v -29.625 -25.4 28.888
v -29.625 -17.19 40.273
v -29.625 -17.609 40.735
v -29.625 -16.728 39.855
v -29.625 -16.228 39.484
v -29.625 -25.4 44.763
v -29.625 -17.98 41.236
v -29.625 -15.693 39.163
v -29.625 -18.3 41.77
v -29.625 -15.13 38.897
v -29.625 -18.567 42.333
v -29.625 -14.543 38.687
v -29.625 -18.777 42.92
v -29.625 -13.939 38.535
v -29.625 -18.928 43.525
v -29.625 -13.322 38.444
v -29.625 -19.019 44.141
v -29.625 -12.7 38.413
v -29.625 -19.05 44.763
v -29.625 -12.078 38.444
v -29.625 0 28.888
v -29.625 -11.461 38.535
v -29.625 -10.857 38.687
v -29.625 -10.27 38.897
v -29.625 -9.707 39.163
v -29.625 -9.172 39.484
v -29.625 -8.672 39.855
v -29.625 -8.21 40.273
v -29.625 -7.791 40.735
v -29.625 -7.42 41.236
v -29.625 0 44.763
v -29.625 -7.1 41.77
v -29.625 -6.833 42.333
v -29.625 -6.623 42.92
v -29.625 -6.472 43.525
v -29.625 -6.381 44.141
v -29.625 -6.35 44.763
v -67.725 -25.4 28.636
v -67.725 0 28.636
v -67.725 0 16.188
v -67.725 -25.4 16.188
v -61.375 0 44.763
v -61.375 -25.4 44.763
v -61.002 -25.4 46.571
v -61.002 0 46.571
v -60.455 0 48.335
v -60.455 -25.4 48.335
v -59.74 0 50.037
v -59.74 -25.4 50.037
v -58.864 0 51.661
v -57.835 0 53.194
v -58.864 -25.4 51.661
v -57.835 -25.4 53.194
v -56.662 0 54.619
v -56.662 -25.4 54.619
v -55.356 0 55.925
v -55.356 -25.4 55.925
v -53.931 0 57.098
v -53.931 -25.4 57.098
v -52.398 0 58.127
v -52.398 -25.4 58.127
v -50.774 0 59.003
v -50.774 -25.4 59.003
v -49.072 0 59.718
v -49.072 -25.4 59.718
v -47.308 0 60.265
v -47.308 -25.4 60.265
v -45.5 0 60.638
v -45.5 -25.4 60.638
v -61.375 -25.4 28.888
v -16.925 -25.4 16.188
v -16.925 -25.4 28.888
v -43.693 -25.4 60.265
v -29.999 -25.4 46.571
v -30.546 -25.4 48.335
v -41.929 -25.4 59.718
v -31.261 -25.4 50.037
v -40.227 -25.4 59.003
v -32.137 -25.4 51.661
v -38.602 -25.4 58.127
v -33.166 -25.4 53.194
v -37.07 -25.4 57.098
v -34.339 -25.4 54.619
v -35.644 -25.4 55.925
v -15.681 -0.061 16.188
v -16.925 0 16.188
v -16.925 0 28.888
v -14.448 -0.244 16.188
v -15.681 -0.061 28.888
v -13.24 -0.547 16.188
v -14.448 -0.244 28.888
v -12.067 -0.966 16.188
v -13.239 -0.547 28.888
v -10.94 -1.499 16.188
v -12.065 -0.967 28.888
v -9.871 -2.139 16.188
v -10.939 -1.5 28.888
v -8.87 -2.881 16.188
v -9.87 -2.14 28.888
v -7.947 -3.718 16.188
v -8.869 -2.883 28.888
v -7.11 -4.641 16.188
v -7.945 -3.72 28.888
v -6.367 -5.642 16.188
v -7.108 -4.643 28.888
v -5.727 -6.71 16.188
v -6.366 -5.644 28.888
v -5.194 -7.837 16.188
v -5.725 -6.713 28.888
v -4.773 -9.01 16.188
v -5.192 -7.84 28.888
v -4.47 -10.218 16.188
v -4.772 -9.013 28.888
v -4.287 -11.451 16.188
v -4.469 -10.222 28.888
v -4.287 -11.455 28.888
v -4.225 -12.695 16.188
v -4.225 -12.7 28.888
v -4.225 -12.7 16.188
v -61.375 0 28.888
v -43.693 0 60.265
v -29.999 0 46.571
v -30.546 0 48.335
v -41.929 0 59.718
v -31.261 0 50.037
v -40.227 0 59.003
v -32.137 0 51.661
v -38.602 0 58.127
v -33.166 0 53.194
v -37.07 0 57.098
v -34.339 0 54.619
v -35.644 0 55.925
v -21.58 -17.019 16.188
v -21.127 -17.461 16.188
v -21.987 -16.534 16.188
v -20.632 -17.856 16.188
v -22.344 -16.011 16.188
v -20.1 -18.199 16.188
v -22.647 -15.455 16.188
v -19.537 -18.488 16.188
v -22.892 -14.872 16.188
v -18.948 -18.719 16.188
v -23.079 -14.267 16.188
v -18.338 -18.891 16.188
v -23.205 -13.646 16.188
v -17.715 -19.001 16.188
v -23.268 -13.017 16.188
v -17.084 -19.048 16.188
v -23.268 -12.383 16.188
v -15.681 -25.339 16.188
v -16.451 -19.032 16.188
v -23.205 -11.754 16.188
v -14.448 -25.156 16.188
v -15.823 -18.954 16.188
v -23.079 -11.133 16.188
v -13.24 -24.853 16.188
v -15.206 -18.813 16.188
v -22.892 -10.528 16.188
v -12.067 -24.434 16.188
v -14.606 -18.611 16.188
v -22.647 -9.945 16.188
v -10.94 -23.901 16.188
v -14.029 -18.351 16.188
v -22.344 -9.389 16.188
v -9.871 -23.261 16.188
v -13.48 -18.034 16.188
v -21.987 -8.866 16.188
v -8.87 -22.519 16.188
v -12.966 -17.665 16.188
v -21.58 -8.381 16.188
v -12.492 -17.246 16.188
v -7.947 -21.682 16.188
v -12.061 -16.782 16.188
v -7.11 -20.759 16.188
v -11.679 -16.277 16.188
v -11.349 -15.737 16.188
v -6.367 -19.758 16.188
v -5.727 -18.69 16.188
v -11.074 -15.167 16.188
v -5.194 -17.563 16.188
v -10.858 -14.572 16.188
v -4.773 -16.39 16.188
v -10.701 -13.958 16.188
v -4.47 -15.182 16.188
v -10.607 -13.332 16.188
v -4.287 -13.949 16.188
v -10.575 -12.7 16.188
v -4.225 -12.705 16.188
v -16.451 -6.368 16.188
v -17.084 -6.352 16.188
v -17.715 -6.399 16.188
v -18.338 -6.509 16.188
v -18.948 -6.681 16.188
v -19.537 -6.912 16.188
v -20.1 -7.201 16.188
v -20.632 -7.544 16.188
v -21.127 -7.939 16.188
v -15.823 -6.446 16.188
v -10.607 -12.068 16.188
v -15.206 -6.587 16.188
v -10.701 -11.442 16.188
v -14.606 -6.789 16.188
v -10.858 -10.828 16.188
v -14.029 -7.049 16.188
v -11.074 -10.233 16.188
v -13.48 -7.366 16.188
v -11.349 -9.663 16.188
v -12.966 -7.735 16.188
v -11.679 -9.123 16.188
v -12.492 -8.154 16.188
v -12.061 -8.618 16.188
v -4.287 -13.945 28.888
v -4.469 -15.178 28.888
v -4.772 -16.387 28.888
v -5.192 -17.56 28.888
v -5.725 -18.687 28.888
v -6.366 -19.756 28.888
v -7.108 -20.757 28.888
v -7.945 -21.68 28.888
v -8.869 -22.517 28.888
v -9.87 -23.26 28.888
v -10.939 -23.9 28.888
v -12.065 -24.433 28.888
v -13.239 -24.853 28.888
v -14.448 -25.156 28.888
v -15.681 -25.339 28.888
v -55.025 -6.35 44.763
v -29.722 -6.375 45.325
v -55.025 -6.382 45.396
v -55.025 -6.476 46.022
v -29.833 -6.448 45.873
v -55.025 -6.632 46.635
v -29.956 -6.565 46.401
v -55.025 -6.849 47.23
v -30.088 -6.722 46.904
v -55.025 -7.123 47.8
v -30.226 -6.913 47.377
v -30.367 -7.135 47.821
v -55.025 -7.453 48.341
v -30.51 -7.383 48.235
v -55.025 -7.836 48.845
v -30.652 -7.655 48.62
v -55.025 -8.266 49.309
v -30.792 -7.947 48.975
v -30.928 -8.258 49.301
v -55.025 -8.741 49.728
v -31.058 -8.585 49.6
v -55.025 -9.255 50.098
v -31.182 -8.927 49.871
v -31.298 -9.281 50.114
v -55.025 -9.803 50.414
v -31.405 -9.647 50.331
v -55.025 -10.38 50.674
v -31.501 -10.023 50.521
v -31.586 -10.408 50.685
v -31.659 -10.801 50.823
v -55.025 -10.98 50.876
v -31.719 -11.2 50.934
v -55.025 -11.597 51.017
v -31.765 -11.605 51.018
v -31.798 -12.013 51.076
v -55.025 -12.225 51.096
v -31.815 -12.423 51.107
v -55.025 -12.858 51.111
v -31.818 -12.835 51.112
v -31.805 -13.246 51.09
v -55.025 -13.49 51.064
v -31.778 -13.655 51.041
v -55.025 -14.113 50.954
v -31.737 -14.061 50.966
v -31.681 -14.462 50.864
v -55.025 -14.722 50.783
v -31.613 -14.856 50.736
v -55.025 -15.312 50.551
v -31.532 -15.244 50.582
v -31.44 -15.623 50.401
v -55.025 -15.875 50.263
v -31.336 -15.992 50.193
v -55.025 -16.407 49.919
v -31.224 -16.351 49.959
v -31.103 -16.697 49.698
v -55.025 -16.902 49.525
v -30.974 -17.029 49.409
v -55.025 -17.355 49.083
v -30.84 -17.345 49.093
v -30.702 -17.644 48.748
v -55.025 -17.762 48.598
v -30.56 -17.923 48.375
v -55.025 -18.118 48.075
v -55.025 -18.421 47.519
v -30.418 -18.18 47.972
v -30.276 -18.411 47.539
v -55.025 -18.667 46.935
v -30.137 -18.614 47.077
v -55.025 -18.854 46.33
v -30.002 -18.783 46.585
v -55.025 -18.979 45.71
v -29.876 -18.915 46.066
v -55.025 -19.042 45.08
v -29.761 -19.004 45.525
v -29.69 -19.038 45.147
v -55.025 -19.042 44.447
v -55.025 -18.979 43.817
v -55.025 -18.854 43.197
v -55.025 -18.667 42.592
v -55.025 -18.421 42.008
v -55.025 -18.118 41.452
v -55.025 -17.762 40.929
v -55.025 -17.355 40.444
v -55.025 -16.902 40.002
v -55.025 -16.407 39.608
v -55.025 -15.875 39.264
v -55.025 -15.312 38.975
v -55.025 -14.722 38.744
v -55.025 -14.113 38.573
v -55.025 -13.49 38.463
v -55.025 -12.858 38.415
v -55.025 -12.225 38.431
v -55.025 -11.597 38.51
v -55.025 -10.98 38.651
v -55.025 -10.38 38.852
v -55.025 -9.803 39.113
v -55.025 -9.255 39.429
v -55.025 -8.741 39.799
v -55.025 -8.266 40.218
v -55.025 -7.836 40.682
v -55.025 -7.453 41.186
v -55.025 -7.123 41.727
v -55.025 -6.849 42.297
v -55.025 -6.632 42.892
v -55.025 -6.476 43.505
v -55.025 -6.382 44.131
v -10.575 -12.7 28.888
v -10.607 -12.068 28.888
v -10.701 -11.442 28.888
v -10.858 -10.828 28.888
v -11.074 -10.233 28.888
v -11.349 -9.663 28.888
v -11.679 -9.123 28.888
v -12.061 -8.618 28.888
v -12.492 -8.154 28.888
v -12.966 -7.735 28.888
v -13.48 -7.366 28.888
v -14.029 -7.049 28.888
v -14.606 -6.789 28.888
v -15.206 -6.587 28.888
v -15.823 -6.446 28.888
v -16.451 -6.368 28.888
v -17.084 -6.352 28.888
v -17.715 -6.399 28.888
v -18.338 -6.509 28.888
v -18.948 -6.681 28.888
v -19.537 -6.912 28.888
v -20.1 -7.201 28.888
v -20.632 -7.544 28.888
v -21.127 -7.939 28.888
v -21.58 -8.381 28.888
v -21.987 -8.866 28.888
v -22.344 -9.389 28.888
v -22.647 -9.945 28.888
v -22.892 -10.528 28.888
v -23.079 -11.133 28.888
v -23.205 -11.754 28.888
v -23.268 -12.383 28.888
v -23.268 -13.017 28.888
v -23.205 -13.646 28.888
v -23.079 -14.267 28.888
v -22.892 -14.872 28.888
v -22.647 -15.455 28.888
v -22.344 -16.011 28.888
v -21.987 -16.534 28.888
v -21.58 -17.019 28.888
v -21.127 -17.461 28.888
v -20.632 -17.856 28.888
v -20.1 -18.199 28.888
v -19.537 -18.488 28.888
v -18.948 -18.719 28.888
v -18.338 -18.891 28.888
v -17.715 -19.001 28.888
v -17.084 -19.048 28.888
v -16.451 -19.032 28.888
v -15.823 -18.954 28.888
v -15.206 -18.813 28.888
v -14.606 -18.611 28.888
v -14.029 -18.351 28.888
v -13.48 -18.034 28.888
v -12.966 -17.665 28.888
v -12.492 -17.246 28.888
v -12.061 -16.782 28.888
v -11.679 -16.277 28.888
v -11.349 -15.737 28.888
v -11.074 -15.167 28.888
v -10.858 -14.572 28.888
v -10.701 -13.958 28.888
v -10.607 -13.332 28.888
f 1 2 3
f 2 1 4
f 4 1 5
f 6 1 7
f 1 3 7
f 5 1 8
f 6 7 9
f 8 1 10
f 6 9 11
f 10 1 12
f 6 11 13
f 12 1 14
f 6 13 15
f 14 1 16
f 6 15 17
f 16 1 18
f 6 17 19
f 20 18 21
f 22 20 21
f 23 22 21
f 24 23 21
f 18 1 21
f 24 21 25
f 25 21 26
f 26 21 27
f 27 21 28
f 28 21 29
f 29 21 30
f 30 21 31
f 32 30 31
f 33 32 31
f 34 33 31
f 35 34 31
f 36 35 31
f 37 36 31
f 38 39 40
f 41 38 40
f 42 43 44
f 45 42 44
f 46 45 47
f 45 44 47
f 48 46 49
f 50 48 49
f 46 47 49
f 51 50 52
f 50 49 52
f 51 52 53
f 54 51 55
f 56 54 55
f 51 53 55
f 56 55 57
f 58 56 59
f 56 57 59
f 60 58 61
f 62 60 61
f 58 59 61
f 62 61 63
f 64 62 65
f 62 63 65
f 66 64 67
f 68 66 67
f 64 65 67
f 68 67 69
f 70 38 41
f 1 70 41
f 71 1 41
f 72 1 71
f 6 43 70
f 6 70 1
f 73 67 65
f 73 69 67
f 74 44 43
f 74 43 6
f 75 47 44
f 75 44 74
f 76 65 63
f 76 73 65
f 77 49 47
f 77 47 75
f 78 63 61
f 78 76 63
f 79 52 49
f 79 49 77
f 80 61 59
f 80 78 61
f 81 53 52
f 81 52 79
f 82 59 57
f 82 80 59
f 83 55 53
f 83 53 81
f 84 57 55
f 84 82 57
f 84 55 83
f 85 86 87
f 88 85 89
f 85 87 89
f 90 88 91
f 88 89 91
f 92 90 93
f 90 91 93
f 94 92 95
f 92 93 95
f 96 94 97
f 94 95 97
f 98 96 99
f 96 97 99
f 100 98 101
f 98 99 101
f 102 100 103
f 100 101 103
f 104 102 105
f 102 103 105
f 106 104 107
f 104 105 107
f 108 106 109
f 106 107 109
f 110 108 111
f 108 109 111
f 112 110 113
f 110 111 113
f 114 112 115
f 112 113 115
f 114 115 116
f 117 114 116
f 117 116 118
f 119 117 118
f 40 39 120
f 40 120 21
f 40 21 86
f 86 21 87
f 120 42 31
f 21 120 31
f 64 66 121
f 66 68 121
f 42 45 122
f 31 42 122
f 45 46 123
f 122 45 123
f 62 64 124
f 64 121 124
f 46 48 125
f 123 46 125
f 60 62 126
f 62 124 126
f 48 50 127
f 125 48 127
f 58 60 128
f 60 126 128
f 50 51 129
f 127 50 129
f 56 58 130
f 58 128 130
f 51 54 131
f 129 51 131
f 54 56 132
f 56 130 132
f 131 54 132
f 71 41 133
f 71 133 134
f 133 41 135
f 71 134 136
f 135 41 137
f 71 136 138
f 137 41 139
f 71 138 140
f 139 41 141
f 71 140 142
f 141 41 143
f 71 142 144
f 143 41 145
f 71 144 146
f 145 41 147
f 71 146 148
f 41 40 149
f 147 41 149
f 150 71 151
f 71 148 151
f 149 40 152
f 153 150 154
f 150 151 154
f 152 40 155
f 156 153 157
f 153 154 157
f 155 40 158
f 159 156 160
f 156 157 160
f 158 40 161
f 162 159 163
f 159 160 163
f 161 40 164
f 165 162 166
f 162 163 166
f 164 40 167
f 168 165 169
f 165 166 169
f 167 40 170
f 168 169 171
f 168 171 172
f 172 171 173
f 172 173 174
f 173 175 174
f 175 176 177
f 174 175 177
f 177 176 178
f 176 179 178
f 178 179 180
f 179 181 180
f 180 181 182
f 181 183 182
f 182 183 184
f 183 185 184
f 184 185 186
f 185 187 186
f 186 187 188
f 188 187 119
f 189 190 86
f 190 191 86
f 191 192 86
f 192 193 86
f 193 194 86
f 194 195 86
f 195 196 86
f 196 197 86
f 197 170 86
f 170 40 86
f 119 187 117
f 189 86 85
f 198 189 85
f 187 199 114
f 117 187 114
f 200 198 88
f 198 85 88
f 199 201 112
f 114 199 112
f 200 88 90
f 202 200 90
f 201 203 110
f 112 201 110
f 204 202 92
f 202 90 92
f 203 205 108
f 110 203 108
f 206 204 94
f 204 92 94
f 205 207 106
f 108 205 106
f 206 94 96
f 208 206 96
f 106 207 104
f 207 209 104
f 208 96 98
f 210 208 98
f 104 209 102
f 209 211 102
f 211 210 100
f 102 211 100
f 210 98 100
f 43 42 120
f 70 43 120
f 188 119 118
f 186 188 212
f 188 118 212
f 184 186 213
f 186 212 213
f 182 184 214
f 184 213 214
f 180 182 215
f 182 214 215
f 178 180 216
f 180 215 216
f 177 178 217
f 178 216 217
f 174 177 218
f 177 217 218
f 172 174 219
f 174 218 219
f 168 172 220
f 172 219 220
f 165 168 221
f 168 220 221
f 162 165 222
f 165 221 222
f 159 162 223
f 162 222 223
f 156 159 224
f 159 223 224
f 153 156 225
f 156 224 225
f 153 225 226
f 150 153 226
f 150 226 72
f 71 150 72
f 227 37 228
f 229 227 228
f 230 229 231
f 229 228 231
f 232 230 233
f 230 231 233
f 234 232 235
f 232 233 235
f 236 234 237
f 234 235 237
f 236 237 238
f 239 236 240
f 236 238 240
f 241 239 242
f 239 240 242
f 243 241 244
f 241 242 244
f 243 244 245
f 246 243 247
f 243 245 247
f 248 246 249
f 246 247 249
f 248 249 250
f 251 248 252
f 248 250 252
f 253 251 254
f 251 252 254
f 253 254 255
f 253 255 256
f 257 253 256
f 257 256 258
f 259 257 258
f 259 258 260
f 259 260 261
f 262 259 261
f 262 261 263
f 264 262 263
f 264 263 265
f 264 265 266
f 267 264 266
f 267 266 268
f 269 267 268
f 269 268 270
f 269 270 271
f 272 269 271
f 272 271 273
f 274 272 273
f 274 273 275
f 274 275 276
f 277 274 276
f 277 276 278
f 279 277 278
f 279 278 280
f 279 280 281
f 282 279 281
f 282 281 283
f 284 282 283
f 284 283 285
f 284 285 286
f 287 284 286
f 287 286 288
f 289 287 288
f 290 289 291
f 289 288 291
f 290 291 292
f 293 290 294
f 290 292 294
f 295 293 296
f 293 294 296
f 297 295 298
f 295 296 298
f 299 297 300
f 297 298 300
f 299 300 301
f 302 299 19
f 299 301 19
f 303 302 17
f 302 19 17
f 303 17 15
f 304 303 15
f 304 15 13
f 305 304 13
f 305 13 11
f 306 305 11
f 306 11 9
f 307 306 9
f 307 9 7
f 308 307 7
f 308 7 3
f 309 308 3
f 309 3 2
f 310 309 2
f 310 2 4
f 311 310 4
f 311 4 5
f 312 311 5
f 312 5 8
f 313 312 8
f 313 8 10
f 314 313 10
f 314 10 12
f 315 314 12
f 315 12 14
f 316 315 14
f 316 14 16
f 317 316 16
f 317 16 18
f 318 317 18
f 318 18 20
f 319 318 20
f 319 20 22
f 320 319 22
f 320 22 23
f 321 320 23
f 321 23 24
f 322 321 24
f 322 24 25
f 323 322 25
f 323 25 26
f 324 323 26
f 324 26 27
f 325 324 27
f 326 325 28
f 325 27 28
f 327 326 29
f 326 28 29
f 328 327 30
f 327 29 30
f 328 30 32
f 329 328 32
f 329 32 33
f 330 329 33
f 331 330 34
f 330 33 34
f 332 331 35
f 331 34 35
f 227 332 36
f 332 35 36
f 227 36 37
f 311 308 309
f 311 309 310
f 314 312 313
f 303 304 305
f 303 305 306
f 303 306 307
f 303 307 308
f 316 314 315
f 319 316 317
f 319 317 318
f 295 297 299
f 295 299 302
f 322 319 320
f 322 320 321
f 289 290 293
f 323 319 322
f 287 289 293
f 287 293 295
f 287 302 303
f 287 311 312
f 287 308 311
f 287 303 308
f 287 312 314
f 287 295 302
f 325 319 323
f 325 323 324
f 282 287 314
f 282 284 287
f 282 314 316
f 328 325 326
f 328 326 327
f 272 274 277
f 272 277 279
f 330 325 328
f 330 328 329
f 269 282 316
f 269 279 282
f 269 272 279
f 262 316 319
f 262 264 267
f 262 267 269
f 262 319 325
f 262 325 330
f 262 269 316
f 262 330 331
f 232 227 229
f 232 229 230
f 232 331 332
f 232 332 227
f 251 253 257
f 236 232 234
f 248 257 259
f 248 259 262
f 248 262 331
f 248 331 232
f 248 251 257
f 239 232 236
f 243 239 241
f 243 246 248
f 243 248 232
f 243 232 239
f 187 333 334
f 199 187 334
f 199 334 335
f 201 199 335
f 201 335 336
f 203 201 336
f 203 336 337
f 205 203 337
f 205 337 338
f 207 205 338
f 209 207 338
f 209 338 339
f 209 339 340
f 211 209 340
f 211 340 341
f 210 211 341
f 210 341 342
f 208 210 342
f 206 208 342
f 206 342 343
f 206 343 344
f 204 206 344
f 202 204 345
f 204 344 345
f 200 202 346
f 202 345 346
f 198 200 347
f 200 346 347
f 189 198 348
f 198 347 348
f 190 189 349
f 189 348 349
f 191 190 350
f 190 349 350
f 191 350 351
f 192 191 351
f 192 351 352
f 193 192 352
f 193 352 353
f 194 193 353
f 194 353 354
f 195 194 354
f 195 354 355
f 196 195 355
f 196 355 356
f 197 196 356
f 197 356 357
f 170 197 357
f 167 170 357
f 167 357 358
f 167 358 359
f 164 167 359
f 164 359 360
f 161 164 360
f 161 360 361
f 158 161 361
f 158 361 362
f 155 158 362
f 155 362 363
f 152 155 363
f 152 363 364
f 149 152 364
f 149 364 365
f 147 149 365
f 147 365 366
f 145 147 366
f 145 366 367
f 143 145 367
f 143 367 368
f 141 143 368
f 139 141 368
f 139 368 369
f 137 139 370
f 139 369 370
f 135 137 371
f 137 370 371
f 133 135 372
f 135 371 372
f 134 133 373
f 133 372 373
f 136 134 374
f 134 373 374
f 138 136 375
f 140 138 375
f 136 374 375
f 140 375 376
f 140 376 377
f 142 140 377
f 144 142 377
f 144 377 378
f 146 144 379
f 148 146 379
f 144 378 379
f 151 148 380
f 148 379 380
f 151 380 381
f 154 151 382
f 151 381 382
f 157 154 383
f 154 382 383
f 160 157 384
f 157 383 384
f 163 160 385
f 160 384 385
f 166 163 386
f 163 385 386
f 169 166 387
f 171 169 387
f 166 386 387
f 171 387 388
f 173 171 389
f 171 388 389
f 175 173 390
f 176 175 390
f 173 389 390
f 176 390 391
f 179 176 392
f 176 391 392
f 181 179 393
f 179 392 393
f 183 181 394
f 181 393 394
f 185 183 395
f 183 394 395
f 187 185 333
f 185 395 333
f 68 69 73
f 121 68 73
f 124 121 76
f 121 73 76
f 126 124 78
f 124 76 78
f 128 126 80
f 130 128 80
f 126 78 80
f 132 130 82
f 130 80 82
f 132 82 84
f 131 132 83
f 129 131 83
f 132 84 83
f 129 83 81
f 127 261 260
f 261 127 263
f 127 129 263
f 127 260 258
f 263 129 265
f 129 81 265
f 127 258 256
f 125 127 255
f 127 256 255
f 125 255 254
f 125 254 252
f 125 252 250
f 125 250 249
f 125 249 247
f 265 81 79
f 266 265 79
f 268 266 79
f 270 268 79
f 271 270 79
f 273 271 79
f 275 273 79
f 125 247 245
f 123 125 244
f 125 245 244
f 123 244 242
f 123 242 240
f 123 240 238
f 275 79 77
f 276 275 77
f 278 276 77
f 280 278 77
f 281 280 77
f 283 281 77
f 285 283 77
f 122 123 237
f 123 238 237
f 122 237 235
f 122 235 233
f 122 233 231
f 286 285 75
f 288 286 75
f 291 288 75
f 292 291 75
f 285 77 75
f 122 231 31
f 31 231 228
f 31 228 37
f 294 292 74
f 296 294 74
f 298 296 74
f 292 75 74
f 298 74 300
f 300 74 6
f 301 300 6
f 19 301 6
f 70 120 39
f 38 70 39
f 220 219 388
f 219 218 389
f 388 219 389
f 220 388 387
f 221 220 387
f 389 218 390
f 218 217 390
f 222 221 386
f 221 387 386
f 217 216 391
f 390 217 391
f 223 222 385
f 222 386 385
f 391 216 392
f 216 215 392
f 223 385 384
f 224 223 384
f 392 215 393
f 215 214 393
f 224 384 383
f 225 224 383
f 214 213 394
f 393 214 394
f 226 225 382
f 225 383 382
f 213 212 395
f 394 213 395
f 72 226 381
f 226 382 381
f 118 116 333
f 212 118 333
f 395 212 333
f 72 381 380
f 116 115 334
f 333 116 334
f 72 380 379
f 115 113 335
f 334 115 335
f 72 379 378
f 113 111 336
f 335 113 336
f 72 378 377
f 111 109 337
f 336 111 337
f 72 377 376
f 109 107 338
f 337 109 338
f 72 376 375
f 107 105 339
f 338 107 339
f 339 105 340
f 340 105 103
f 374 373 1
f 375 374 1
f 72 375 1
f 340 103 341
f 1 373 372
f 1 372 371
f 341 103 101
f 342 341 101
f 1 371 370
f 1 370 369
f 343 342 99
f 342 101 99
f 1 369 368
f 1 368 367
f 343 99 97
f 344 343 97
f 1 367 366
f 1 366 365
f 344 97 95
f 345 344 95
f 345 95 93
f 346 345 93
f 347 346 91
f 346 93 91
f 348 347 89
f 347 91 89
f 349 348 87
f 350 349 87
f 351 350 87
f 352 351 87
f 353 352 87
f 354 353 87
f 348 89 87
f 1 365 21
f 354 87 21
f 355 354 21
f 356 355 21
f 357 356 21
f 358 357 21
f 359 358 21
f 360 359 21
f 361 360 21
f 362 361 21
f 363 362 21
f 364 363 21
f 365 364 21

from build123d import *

# Parameters (mm, degrees)
F1_DEPTH = 25.4
F3_DEPTH = 25.4
F4_R     = 6.35
F5_DEPTH = 25.4
F7_DEPTH = 25.4
F9_DEPTH = 25.4


# Not quite as in the source:
# - ends of sketch curves that miss each other by under 0.0002 mm in the source are joined


with BuildPart() as f1:
    # F0 (on Front) → F1 (new body)
    with BuildSketch(Plane.XZ):
        Polygon((-67.7254482706, 28.6358930171), (-67.7254482706, 16.1884303746), (-4.2254482706, 16.1884303746), (-4.2254482706, 28.8884303746), (-29.6254482706, 28.8884303746), (-29.6254482706, 60.6384303746), (-61.3754482706, 60.6384303746), (-61.3754482706, 28.8884303746), align=None)
    extrude(amount=F1_DEPTH)

    # F2 (on face) → F3 (cut)
    with BuildSketch(Plane.XY.offset(28.8884303746)):
        with BuildLine():
            ThreePointArc((-16.9254482706, 0), (-7.9451915343, -3.7197435424), (-4.2254473189, -12.7))
            Line((-4.2254473189, -12.7), (-4.2254482706, 0))
            Line((-4.2254482706, 0), (-16.9254482706, 0))
        make_face()
        with BuildLine():
            ThreePointArc((-4.2254473189, -12.7), (-7.9451908613, -21.6802557846), (-16.9254463672, -25.4))
            Line((-16.9254463672, -25.4), (-4.2254482706, -25.4))
            Line((-4.2254482706, -25.4), (-4.2254473189, -12.7))
        make_face()
    extrude(amount=-F3_DEPTH, mode=Mode.SUBTRACT)

    # F4 (on face) → F5 (cut)
    with BuildSketch(Plane.XY.offset(28.8884303746)):
        with Locations((-16.9254473189, -12.7)):
            Circle(F4_R)
    extrude(amount=-F5_DEPTH, mode=Mode.SUBTRACT)

    # F6 (on face) → F7 (cut)
    with BuildSketch(Plane.XZ.offset(25.4)):
        with BuildLine():
            ThreePointArc((-45.5004482706, 60.6384303746), (-34.9759157672, 55.287962878), (-29.6254482706, 44.7634303746))
            Line((-29.6254482706, 44.7634303746), (-29.6254482706, 60.6384303746))
            Line((-29.6254482706, 60.6384303746), (-45.5004482706, 60.6384303746))
        make_face()
        with BuildLine():
            ThreePointArc((-61.3754482706, 44.7634303746), (-56.0249807741, 55.287962878), (-45.5004482706, 60.6384303746))
            Line((-45.5004482706, 60.6384303746), (-61.3754482706, 60.6384303746))
            Line((-61.3754482706, 60.6384303746), (-61.3754482706, 44.7634303746))
        make_face()
    extrude(amount=-F7_DEPTH, mode=Mode.SUBTRACT)

    # F8 (on face) → F9 (cut)
    with BuildSketch(Plane.YZ.offset(-29.6254482706)):
        with BuildLine():
            ThreePointArc((-19.05, 44.7634303746), (-12.7, 38.4134303746), (-6.35, 44.7634303746))
            Line((-6.35, 44.7634303746), (-19.05, 44.7634303746))
        make_face()
        with BuildLine():
            Line((-19.05, 44.7634303746), (-6.35, 44.7634303746))
            ThreePointArc((-6.35, 44.7634303746), (-12.7, 51.1134303746), (-19.05, 44.7634303746))
        make_face()
    extrude(amount=-F9_DEPTH, mode=Mode.SUBTRACT)


solid = f1.part
